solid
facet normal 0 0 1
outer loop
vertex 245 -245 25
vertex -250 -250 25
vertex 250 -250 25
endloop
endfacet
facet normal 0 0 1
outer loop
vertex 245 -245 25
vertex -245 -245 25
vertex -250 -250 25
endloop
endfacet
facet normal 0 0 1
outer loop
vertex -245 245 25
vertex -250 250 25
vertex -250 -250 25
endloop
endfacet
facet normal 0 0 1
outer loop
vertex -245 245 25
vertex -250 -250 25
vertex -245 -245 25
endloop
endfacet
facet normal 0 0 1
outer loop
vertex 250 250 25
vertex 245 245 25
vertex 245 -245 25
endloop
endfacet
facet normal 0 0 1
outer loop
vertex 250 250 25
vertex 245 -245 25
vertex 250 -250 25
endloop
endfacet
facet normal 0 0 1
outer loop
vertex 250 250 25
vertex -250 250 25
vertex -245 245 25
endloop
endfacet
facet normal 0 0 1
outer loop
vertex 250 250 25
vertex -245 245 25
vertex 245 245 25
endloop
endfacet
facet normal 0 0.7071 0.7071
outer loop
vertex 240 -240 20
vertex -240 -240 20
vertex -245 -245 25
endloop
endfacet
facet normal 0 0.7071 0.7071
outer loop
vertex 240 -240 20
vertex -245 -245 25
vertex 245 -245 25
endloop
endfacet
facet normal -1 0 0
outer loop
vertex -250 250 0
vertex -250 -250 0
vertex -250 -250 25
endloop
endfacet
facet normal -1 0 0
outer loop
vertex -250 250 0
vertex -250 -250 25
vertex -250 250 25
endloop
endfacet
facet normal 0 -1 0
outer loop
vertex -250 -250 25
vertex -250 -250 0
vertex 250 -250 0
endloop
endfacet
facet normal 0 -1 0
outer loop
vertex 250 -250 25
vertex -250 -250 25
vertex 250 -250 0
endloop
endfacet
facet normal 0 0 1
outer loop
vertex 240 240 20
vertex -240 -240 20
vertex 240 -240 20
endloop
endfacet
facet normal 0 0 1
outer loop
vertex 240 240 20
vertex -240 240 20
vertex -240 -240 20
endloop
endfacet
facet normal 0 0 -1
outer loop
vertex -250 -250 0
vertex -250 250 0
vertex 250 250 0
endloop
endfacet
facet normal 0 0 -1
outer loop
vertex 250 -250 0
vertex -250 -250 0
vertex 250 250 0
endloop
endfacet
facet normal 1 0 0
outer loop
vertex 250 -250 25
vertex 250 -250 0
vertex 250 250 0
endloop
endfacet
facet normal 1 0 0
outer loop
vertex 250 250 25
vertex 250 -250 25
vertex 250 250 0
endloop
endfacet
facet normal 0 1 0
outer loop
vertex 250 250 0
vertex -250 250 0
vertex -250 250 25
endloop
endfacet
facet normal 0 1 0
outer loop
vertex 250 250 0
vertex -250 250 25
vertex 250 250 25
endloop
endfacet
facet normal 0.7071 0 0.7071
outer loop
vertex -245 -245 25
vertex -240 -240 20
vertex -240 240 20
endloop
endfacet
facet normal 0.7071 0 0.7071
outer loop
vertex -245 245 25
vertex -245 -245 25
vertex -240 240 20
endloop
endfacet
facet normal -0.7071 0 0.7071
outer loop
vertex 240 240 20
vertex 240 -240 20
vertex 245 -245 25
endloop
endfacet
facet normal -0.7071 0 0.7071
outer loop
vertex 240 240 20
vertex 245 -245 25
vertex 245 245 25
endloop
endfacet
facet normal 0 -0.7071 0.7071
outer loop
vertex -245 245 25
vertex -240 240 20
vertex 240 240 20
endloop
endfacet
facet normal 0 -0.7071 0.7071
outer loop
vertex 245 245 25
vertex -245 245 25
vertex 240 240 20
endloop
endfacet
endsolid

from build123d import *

# Parameters (mm, degrees)
F0_W     = 500
F0_H     = 500
F1_DEPTH = 25
F2_W     = 490.0000095367
F2_H     = 490.0000095367
F3_DEPTH = 5
F4_SIZE  = 4.99999


# Not quite as in the source:
# - a fillet or chamfer is up to 0.001 mm smaller than in the source, because OpenCascade refuses the exact size


with BuildPart() as f1:
    # F0 (on Top) → F1 (new body)
    with BuildSketch(Plane.XY):
        Rectangle(F0_W, F0_H)
    extrude(amount=F1_DEPTH)

    # F2 (on face) → F3 (cut)
    with BuildSketch(Plane.XY.offset(25)):
        Rectangle(F2_W, F2_H)
    extrude(amount=-F3_DEPTH, mode=Mode.SUBTRACT)

    # F4 (size 5 in the source; OpenCascade refuses exactly that, so slightly less here)
    f4_edges = [f1.edges().sort_by_distance(p)[0] for p in [
        (0, -245.000005, 20),
        (245.000005, 0, 20),
        (0, 245.000005, 20),
        (-245.000005, 0, 20),
    ]]
    chamfer(f4_edges, length=F4_SIZE)


solid = f1.part
